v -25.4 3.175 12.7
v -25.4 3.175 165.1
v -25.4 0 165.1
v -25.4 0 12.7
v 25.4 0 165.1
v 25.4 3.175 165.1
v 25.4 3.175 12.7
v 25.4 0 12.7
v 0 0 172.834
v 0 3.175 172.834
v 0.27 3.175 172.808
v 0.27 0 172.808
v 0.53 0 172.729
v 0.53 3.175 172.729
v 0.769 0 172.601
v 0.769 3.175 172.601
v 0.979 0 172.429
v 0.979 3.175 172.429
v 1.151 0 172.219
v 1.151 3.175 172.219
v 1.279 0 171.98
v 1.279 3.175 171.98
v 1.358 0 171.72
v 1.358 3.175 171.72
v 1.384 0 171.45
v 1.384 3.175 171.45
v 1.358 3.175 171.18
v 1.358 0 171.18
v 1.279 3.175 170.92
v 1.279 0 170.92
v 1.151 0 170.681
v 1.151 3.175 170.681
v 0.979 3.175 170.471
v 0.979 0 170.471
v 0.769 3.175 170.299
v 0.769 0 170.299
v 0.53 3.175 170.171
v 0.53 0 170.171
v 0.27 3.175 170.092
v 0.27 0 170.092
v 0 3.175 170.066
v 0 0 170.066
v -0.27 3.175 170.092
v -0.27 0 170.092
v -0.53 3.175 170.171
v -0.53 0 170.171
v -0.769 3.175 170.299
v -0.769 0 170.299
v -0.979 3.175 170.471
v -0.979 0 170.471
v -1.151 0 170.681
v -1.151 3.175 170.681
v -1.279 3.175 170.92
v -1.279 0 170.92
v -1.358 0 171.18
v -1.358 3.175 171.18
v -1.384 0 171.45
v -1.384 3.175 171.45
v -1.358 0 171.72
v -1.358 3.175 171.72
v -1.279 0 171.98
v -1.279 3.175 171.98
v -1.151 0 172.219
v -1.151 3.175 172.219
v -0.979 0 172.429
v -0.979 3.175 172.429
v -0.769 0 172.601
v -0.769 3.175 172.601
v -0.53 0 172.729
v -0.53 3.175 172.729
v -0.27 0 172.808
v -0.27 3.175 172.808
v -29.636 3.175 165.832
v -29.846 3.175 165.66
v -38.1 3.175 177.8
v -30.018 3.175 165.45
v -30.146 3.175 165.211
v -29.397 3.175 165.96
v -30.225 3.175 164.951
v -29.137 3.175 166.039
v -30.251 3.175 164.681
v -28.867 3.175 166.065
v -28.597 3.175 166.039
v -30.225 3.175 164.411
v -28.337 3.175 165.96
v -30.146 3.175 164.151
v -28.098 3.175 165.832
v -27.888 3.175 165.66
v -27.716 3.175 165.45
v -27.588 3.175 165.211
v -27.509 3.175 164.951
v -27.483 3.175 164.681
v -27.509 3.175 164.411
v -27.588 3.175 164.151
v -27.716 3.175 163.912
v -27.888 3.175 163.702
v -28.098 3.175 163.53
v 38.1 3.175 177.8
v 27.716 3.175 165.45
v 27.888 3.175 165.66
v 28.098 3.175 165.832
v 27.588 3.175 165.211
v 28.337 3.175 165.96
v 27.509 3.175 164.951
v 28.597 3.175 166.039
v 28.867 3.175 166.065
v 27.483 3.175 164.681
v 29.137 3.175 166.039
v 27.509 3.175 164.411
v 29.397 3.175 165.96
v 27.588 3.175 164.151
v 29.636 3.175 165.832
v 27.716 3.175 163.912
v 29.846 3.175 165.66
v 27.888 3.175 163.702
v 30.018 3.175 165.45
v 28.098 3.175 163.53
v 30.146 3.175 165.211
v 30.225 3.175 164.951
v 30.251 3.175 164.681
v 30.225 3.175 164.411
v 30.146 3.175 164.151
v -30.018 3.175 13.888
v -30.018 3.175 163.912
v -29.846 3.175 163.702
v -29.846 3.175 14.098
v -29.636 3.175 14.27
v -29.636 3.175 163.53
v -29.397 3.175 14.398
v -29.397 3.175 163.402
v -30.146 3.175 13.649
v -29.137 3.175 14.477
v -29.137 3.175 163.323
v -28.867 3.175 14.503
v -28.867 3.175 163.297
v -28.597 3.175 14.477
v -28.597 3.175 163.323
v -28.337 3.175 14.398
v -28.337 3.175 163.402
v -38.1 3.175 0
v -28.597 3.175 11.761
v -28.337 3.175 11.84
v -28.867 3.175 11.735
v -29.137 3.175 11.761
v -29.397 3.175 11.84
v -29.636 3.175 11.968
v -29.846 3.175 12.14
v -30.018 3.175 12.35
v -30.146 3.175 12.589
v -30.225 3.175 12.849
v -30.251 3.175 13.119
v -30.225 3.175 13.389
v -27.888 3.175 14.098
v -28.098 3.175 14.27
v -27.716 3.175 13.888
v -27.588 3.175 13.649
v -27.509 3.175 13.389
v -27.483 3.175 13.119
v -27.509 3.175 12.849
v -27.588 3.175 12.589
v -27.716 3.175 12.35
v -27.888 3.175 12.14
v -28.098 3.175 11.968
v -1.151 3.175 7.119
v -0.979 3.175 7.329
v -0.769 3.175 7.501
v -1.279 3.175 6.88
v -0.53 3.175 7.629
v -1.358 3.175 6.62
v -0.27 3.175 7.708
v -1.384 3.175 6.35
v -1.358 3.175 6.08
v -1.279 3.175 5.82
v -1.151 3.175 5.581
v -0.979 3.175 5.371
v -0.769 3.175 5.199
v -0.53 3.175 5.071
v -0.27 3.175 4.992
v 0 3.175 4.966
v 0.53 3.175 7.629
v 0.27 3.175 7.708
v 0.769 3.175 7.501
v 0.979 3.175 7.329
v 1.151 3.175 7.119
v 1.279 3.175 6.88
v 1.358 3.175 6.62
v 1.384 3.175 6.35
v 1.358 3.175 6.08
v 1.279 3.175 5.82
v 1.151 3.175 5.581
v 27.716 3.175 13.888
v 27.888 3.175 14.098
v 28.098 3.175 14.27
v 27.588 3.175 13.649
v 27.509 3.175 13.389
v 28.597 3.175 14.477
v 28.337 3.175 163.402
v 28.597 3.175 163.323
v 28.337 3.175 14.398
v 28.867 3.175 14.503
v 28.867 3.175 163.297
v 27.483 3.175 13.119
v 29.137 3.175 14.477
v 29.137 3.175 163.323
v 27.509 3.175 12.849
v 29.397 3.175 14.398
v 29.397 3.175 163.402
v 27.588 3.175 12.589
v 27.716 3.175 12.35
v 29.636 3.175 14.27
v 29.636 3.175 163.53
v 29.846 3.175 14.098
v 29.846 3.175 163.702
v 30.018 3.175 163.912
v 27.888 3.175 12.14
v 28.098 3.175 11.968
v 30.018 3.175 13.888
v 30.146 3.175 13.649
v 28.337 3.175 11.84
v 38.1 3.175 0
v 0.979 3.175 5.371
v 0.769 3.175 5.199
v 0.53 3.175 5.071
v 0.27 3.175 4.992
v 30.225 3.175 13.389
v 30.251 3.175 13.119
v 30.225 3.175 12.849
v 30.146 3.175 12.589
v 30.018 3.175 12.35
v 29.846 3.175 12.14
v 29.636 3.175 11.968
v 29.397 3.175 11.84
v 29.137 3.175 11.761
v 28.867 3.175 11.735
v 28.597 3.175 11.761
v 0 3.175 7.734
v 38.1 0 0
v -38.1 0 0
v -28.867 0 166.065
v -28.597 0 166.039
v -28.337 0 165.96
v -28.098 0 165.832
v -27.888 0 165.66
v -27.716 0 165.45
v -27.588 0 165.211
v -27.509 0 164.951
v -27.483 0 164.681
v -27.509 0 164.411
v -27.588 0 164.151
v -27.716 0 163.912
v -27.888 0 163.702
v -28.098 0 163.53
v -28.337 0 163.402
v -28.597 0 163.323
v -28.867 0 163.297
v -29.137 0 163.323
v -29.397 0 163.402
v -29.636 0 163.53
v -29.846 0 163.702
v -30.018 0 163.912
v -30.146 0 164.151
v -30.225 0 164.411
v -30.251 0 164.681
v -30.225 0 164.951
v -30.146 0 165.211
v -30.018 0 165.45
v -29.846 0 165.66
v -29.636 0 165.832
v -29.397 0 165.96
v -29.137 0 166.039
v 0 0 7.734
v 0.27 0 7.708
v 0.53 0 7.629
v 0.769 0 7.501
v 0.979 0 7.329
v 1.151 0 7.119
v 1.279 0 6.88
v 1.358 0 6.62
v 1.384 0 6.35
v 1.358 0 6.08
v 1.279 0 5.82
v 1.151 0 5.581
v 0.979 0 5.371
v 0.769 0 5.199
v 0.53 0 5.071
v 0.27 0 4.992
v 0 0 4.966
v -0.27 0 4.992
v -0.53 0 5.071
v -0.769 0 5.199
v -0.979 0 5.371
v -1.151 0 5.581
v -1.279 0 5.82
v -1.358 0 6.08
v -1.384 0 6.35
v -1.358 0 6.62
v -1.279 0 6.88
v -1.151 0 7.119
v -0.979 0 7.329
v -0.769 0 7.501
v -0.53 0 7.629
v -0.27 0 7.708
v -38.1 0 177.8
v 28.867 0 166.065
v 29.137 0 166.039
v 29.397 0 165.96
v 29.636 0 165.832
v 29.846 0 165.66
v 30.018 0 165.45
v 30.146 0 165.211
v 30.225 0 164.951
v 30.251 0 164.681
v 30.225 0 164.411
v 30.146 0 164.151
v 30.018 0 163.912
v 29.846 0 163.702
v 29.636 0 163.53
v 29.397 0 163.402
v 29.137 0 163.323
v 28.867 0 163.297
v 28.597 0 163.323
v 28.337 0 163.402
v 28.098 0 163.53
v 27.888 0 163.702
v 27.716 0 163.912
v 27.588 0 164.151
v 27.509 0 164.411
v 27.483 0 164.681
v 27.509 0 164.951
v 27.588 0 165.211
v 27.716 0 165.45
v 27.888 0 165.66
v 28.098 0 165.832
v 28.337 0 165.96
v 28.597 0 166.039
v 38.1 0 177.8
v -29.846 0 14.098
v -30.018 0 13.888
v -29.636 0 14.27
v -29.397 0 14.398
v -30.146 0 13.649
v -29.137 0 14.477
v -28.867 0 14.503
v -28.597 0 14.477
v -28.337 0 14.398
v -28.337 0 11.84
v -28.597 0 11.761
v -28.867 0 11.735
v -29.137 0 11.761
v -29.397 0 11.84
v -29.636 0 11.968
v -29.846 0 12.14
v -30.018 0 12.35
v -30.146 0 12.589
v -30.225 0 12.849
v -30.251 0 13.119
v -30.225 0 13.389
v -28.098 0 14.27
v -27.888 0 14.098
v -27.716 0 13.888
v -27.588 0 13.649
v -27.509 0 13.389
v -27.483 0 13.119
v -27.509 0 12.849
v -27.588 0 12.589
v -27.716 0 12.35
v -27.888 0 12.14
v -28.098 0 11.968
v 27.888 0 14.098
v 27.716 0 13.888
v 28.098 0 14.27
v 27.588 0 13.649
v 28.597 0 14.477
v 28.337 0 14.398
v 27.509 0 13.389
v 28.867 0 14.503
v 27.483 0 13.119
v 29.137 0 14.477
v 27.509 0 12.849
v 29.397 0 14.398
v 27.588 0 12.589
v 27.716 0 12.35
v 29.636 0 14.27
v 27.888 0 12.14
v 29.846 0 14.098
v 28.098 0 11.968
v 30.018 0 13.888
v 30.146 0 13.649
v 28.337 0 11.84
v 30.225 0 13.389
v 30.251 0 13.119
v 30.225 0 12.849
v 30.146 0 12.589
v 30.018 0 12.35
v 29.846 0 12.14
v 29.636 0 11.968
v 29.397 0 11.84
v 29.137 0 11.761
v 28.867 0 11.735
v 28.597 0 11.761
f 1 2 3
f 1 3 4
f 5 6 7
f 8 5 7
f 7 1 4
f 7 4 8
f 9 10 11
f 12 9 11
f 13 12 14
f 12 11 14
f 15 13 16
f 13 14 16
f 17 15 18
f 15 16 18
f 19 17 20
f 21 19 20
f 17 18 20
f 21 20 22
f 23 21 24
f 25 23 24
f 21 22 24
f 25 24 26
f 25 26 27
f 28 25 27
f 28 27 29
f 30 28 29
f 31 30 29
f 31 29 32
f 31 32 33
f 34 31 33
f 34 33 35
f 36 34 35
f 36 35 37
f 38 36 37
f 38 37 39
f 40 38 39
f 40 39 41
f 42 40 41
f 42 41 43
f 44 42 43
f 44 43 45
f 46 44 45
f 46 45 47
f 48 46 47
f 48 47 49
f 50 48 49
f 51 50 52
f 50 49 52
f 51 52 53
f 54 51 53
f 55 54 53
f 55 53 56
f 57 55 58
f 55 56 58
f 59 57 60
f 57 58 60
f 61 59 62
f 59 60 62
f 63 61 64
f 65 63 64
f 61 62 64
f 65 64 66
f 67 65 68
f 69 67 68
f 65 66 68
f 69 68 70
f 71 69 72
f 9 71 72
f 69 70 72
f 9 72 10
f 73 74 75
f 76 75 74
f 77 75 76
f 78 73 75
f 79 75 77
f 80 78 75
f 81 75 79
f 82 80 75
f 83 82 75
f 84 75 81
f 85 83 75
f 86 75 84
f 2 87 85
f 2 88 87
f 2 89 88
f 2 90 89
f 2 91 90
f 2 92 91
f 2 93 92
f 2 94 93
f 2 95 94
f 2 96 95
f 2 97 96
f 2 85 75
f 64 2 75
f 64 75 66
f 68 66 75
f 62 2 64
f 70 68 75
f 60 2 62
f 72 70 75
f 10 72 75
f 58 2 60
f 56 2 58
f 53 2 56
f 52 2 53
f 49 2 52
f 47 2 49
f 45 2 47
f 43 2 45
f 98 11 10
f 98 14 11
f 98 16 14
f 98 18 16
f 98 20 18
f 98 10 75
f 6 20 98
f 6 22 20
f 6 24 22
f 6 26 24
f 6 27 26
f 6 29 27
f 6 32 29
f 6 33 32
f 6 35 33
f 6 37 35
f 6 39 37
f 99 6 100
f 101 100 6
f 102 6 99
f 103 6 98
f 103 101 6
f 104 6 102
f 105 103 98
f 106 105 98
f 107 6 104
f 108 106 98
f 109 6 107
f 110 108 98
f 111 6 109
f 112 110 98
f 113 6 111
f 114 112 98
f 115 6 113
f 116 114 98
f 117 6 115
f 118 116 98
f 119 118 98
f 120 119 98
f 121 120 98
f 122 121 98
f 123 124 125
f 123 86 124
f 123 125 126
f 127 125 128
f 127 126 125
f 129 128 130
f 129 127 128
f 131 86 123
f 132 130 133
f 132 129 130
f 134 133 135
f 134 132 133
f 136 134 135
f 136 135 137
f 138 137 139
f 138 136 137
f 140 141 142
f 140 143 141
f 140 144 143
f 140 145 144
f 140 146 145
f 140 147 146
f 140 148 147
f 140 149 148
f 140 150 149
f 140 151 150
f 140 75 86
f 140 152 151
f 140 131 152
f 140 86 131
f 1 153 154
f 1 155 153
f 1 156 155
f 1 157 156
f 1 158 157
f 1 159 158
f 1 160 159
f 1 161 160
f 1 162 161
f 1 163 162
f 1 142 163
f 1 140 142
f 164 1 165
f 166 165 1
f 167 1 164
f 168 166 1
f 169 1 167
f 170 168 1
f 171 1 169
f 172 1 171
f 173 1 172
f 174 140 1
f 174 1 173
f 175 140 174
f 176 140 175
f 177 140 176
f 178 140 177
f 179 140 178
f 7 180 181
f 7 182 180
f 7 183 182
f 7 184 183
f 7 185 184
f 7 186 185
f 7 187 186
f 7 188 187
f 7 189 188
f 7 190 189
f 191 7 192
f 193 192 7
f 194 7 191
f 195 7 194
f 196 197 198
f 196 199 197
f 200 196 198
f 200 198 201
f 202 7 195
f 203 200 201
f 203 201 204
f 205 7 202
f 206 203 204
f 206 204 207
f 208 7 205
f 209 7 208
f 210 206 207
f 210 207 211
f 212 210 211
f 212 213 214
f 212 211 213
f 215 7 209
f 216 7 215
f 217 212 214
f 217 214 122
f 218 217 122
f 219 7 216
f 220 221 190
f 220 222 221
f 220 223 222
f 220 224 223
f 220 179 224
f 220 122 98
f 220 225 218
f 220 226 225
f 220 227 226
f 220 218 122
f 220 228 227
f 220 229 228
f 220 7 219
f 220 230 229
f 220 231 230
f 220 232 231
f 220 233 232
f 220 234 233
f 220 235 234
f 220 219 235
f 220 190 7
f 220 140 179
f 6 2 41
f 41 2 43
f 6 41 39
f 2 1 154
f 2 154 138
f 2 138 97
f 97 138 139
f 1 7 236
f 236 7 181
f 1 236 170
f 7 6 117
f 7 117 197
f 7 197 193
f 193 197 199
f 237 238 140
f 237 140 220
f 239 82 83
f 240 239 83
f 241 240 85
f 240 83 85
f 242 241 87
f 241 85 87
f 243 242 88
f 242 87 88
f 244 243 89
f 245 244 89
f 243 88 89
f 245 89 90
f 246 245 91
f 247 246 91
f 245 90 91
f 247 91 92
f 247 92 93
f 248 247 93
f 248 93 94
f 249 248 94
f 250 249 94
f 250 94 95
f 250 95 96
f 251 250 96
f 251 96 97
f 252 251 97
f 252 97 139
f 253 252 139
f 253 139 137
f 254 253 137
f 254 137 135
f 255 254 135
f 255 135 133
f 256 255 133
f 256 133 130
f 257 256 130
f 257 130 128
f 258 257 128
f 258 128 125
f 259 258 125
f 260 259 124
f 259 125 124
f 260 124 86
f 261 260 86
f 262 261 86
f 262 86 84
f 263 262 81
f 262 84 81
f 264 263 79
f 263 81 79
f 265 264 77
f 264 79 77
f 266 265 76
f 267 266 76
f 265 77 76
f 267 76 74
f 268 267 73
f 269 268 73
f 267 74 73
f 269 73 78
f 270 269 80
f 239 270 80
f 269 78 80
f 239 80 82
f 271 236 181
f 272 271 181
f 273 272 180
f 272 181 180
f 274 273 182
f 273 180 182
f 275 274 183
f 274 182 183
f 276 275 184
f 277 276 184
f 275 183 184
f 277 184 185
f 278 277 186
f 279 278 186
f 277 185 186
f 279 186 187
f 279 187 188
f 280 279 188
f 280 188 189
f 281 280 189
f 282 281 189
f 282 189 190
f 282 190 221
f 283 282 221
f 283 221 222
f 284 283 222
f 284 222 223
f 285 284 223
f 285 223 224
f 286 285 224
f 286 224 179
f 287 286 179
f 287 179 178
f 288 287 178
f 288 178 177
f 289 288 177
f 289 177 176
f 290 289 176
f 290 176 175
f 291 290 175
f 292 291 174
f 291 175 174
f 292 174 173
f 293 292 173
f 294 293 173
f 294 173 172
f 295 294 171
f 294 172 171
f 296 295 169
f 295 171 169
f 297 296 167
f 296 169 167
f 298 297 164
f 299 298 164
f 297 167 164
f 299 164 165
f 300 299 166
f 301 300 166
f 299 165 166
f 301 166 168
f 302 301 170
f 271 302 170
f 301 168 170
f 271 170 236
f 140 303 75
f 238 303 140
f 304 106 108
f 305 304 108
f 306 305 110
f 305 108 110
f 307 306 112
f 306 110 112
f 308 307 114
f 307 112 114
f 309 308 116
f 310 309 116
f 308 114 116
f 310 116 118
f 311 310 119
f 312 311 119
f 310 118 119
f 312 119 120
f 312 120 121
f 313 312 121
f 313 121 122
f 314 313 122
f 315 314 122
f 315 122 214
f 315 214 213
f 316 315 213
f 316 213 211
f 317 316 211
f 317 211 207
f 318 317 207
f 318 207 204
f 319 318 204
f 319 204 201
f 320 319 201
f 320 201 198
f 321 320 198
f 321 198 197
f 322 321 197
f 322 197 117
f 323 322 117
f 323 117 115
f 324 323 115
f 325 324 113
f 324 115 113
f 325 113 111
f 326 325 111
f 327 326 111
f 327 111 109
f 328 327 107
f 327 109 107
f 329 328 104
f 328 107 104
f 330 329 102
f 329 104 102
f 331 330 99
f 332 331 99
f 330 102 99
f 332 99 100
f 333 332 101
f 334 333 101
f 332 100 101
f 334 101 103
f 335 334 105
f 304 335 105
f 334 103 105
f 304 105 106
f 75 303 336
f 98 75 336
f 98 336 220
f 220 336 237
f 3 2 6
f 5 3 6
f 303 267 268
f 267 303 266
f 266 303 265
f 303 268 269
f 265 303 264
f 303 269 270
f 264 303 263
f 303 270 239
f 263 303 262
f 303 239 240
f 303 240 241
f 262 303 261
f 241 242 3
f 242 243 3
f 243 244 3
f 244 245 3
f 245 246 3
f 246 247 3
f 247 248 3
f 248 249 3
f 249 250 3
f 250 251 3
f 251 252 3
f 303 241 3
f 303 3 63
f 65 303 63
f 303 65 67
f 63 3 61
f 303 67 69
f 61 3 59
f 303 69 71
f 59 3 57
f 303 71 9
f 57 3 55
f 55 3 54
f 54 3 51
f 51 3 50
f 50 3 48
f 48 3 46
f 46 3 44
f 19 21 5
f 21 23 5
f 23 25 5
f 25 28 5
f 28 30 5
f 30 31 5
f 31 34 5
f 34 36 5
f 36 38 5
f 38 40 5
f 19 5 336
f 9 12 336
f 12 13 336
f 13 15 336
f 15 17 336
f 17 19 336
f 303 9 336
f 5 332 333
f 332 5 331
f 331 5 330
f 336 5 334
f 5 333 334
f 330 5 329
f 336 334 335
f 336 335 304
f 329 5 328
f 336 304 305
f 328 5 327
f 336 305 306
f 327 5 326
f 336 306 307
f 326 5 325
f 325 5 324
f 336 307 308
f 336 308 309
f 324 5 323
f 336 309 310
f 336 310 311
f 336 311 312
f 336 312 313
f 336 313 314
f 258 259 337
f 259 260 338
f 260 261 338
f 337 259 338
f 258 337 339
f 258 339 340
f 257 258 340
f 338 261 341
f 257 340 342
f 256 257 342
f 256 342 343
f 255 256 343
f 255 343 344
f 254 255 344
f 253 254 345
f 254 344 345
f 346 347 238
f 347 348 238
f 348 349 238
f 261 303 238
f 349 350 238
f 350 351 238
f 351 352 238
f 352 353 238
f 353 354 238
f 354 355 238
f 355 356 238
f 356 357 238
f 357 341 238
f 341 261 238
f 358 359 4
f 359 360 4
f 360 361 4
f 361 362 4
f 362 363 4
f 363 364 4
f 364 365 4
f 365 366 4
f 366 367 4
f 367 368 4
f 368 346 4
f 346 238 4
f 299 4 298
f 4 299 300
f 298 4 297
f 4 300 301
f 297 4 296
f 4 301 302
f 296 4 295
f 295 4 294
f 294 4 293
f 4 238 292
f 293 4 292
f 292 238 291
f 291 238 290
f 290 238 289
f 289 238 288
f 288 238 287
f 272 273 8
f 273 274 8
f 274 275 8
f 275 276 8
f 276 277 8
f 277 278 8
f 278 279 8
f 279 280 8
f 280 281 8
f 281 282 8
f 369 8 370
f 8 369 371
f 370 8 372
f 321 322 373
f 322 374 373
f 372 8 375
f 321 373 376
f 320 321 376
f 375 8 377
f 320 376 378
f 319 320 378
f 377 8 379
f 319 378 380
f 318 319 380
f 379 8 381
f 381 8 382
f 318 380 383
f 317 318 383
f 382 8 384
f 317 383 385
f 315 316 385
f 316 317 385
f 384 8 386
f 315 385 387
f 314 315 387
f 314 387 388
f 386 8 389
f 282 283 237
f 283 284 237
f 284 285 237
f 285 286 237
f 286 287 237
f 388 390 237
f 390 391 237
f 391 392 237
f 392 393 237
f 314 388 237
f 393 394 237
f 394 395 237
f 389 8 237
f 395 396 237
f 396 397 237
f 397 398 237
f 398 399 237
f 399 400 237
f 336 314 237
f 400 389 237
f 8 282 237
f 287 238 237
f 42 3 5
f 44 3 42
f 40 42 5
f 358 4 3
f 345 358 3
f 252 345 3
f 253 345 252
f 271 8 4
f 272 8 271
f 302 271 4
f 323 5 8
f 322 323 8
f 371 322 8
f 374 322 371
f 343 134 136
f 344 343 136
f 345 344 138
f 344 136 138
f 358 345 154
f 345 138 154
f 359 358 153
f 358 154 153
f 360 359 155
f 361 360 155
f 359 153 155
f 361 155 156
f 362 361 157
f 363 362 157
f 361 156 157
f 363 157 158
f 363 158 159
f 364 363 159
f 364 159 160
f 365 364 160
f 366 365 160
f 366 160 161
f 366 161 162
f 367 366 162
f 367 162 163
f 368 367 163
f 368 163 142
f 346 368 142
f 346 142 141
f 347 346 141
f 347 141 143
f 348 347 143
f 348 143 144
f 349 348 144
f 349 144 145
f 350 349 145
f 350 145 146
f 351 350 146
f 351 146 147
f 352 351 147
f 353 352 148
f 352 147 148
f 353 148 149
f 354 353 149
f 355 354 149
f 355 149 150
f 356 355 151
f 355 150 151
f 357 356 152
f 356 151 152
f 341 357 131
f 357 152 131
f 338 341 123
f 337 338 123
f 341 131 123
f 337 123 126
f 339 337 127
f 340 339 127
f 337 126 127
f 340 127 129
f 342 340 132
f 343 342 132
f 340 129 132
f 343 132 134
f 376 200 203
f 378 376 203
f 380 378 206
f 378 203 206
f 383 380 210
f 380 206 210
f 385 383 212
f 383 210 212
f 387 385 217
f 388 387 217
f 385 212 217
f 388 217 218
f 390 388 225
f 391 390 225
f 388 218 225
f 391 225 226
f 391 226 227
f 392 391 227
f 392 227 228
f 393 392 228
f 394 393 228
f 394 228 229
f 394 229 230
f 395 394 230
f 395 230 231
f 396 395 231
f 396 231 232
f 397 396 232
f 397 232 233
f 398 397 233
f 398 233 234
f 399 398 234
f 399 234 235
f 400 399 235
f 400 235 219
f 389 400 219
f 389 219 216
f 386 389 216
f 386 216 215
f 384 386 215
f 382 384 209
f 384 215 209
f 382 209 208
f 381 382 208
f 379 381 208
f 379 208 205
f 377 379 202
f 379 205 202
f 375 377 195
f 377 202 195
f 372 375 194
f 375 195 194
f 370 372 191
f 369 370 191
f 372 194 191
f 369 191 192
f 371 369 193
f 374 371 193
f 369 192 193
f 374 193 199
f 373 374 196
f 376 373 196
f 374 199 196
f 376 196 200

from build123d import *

# Parameters (mm, degrees)
SKETCH1_W           = 76.2
SKETCH1_H           = 177.8
BOSS_EXTRUDE1_DEPTH = 3.175
SKETCH2_R           = 1.3843
SKETCH2_W           = 50.8
SKETCH2_H           = 152.4
CUT_EXTRUDE1_DEPTH  = 182.864044344


with BuildPart() as part:
    # Sketch1 → Boss-Extrude1 (new body)
    with BuildSketch(Plane(origin=(0, 0, 0), x_dir=(1, 0, 0), z_dir=(0, 1, 0))):
        with Locations((0, -88.9)):
            Rectangle(SKETCH1_W, SKETCH1_H)
    extrude(amount=BOSS_EXTRUDE1_DEPTH)

    # Sketch2 → Cut-Extrude1 (cut, through all)
    with BuildSketch(Plane(origin=(0, 3.175, 0), x_dir=(1, 0, 0), z_dir=(0, 1, 0))):
        with Locations(Location((0, -6.35, 0), (0, 0, 270))):
            Circle(SKETCH2_R)
        with Locations(Location((0, -171.45, 0), (0, 0, 270))):
            Circle(SKETCH2_R)
        with Locations(Location((-28.8671, -13.1191, 0), (0, 0, 270))):
            Circle(SKETCH2_R)
        with Locations(Location((28.8671, -13.1191, 0), (0, 0, 270))):
            Circle(SKETCH2_R)
        with Locations(Location((-28.8671, -164.6809, 0), (0, 0, 270))):
            Circle(SKETCH2_R)
        with Locations(Location((28.8671, -164.6809, 0), (0, 0, 270))):
            Circle(SKETCH2_R)
        with Locations((0, -88.9)):
            Rectangle(SKETCH2_W, SKETCH2_H)
    extrude(amount=-CUT_EXTRUDE1_DEPTH, mode=Mode.SUBTRACT)


solid = part.part
